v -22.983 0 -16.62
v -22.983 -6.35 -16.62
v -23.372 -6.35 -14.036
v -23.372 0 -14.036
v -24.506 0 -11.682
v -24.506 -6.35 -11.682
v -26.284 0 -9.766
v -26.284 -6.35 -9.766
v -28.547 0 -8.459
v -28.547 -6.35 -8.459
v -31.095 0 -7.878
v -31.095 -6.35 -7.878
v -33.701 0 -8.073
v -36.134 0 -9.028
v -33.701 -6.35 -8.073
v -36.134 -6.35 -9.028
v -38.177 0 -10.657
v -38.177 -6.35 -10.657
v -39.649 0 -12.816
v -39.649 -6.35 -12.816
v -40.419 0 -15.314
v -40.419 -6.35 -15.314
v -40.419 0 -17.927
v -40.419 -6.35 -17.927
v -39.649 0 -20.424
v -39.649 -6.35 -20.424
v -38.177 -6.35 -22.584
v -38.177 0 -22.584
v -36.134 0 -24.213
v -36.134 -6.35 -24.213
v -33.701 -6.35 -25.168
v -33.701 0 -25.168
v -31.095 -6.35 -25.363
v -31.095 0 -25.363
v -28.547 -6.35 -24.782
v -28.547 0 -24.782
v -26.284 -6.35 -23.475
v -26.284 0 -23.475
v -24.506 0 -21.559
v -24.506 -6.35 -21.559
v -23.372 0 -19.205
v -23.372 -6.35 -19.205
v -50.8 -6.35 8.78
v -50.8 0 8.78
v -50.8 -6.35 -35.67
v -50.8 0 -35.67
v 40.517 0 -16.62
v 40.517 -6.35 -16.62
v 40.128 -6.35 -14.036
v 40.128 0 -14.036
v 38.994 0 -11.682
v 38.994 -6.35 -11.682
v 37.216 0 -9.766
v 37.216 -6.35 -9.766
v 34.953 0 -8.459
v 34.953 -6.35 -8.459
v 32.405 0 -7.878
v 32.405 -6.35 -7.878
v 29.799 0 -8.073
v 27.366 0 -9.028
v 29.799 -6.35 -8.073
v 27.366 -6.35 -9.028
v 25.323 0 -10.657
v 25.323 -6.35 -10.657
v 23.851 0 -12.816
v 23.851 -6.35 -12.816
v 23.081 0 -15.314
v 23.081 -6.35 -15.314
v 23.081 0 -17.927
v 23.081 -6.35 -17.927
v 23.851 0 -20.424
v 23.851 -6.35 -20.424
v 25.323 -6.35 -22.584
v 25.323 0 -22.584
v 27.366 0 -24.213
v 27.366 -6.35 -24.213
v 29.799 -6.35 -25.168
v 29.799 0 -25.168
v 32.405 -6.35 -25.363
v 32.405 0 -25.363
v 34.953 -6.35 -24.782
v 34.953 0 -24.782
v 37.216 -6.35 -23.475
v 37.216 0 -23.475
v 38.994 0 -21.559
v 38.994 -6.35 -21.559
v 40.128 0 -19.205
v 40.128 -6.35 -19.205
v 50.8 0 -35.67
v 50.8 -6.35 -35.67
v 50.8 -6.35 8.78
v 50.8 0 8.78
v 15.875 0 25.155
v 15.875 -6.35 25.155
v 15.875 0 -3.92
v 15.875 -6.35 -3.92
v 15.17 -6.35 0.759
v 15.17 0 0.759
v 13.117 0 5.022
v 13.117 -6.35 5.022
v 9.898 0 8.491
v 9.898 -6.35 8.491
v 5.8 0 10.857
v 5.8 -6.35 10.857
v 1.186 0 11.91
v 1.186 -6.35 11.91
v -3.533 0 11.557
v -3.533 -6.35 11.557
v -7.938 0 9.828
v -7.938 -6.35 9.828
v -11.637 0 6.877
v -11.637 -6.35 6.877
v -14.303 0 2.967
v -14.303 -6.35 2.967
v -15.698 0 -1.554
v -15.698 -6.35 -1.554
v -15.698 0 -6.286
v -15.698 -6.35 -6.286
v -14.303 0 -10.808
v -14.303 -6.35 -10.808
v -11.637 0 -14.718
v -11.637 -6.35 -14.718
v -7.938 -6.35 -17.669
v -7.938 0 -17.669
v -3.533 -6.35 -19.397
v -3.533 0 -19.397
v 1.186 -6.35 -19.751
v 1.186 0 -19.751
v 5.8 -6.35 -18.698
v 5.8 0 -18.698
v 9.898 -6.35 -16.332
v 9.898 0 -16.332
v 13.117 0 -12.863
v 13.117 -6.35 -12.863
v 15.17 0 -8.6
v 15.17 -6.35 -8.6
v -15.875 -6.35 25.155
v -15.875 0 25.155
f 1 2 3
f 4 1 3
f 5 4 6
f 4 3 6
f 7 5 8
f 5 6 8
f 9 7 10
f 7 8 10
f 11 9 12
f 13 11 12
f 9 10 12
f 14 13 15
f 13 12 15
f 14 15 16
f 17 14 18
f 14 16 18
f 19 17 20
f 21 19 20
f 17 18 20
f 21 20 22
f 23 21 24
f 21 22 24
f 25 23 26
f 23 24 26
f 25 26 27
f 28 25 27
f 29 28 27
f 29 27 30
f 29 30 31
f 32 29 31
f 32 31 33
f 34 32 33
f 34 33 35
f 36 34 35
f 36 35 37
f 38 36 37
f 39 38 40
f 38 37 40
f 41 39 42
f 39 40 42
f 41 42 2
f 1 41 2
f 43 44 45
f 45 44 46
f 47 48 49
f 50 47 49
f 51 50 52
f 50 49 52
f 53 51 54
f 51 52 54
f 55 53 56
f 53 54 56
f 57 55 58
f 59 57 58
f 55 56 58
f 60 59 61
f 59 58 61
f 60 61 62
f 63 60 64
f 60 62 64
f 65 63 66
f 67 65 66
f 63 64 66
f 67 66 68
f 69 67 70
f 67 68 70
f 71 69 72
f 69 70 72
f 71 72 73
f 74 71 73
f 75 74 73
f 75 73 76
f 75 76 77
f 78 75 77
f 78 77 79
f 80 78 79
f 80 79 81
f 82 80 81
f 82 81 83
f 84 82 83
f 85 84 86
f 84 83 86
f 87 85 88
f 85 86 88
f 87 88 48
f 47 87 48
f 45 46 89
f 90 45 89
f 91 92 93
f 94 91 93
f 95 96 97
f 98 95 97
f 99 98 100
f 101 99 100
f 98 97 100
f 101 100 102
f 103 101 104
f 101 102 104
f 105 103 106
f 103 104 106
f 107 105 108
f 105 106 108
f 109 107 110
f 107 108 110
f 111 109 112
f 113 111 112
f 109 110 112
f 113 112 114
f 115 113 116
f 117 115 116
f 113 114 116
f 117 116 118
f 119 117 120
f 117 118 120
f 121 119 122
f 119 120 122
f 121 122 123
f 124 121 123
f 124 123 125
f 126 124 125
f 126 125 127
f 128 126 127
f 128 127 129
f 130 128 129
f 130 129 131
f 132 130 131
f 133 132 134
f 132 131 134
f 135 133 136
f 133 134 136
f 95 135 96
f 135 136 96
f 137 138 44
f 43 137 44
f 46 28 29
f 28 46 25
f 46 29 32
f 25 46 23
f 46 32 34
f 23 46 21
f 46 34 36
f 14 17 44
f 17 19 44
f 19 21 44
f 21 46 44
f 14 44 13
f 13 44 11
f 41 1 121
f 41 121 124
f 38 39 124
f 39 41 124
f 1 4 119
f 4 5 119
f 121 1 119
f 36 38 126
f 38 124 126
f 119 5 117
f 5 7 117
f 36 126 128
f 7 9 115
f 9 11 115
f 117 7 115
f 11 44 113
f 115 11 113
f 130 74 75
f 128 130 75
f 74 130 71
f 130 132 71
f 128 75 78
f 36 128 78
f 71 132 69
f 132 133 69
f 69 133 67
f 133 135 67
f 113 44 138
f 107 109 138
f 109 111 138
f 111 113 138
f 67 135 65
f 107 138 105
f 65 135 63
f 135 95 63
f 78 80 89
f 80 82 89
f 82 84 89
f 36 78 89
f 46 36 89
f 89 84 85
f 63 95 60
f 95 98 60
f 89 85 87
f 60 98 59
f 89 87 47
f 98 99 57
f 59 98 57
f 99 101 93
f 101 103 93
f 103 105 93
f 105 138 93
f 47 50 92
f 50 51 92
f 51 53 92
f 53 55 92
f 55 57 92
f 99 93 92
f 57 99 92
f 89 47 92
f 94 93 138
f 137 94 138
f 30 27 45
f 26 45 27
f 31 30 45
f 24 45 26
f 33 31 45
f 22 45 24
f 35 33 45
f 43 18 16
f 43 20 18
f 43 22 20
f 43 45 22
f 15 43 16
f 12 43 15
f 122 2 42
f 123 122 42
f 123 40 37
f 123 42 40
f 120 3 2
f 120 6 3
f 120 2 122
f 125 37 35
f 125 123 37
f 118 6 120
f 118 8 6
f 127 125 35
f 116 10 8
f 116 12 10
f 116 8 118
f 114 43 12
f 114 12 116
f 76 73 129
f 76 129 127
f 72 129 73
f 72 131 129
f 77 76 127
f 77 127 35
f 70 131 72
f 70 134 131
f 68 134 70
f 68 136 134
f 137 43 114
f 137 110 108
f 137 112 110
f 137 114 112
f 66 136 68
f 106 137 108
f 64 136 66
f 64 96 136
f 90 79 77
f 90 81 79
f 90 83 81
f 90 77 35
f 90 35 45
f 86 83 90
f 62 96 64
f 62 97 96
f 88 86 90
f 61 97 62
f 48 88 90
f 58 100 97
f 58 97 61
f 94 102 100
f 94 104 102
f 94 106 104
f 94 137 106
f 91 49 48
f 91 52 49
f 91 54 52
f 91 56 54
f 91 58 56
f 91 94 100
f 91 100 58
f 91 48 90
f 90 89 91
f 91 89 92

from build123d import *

# Parameters (mm, degrees)
F1_DEPTH = 6.35
F2_R     = 15.875
F2_R_2   = 8.7674107973
F3_DEPTH = 6.35


# Not quite as in the source:
# - a feature names something its author has since deleted; it is built from what else it names


with BuildPart() as f1:
    # F0 (on Front) → F1 (new body)
    with BuildSketch(Plane.XZ):
        Polygon((-15.875, 25.1552741975), (-50.8, 8.7795666171), (-50.8, -35.6704333829), (0, -35.6704333829), (0, 25.1552741975), align=None)
        Polygon((0, 25.1552741975), (0, -35.6704333829), (50.8, -35.6704333829), (50.8, 8.7795666171), (15.875, 25.1552741975), align=None)
    extrude(amount=F1_DEPTH)

    # F2 (on face) → F3 (cut)
    with BuildSketch(Plane.XZ.offset(6.35)):
        with Locations((0, -3.9204333829)):
            Circle(F2_R)
        with Locations((31.75, -16.6204333829)):
            Circle(F2_R_2)
        with Locations((-31.75, -16.6204333829)):
            Circle(F2_R_2)
    extrude(amount=-F3_DEPTH, mode=Mode.SUBTRACT)


solid = f1.part
